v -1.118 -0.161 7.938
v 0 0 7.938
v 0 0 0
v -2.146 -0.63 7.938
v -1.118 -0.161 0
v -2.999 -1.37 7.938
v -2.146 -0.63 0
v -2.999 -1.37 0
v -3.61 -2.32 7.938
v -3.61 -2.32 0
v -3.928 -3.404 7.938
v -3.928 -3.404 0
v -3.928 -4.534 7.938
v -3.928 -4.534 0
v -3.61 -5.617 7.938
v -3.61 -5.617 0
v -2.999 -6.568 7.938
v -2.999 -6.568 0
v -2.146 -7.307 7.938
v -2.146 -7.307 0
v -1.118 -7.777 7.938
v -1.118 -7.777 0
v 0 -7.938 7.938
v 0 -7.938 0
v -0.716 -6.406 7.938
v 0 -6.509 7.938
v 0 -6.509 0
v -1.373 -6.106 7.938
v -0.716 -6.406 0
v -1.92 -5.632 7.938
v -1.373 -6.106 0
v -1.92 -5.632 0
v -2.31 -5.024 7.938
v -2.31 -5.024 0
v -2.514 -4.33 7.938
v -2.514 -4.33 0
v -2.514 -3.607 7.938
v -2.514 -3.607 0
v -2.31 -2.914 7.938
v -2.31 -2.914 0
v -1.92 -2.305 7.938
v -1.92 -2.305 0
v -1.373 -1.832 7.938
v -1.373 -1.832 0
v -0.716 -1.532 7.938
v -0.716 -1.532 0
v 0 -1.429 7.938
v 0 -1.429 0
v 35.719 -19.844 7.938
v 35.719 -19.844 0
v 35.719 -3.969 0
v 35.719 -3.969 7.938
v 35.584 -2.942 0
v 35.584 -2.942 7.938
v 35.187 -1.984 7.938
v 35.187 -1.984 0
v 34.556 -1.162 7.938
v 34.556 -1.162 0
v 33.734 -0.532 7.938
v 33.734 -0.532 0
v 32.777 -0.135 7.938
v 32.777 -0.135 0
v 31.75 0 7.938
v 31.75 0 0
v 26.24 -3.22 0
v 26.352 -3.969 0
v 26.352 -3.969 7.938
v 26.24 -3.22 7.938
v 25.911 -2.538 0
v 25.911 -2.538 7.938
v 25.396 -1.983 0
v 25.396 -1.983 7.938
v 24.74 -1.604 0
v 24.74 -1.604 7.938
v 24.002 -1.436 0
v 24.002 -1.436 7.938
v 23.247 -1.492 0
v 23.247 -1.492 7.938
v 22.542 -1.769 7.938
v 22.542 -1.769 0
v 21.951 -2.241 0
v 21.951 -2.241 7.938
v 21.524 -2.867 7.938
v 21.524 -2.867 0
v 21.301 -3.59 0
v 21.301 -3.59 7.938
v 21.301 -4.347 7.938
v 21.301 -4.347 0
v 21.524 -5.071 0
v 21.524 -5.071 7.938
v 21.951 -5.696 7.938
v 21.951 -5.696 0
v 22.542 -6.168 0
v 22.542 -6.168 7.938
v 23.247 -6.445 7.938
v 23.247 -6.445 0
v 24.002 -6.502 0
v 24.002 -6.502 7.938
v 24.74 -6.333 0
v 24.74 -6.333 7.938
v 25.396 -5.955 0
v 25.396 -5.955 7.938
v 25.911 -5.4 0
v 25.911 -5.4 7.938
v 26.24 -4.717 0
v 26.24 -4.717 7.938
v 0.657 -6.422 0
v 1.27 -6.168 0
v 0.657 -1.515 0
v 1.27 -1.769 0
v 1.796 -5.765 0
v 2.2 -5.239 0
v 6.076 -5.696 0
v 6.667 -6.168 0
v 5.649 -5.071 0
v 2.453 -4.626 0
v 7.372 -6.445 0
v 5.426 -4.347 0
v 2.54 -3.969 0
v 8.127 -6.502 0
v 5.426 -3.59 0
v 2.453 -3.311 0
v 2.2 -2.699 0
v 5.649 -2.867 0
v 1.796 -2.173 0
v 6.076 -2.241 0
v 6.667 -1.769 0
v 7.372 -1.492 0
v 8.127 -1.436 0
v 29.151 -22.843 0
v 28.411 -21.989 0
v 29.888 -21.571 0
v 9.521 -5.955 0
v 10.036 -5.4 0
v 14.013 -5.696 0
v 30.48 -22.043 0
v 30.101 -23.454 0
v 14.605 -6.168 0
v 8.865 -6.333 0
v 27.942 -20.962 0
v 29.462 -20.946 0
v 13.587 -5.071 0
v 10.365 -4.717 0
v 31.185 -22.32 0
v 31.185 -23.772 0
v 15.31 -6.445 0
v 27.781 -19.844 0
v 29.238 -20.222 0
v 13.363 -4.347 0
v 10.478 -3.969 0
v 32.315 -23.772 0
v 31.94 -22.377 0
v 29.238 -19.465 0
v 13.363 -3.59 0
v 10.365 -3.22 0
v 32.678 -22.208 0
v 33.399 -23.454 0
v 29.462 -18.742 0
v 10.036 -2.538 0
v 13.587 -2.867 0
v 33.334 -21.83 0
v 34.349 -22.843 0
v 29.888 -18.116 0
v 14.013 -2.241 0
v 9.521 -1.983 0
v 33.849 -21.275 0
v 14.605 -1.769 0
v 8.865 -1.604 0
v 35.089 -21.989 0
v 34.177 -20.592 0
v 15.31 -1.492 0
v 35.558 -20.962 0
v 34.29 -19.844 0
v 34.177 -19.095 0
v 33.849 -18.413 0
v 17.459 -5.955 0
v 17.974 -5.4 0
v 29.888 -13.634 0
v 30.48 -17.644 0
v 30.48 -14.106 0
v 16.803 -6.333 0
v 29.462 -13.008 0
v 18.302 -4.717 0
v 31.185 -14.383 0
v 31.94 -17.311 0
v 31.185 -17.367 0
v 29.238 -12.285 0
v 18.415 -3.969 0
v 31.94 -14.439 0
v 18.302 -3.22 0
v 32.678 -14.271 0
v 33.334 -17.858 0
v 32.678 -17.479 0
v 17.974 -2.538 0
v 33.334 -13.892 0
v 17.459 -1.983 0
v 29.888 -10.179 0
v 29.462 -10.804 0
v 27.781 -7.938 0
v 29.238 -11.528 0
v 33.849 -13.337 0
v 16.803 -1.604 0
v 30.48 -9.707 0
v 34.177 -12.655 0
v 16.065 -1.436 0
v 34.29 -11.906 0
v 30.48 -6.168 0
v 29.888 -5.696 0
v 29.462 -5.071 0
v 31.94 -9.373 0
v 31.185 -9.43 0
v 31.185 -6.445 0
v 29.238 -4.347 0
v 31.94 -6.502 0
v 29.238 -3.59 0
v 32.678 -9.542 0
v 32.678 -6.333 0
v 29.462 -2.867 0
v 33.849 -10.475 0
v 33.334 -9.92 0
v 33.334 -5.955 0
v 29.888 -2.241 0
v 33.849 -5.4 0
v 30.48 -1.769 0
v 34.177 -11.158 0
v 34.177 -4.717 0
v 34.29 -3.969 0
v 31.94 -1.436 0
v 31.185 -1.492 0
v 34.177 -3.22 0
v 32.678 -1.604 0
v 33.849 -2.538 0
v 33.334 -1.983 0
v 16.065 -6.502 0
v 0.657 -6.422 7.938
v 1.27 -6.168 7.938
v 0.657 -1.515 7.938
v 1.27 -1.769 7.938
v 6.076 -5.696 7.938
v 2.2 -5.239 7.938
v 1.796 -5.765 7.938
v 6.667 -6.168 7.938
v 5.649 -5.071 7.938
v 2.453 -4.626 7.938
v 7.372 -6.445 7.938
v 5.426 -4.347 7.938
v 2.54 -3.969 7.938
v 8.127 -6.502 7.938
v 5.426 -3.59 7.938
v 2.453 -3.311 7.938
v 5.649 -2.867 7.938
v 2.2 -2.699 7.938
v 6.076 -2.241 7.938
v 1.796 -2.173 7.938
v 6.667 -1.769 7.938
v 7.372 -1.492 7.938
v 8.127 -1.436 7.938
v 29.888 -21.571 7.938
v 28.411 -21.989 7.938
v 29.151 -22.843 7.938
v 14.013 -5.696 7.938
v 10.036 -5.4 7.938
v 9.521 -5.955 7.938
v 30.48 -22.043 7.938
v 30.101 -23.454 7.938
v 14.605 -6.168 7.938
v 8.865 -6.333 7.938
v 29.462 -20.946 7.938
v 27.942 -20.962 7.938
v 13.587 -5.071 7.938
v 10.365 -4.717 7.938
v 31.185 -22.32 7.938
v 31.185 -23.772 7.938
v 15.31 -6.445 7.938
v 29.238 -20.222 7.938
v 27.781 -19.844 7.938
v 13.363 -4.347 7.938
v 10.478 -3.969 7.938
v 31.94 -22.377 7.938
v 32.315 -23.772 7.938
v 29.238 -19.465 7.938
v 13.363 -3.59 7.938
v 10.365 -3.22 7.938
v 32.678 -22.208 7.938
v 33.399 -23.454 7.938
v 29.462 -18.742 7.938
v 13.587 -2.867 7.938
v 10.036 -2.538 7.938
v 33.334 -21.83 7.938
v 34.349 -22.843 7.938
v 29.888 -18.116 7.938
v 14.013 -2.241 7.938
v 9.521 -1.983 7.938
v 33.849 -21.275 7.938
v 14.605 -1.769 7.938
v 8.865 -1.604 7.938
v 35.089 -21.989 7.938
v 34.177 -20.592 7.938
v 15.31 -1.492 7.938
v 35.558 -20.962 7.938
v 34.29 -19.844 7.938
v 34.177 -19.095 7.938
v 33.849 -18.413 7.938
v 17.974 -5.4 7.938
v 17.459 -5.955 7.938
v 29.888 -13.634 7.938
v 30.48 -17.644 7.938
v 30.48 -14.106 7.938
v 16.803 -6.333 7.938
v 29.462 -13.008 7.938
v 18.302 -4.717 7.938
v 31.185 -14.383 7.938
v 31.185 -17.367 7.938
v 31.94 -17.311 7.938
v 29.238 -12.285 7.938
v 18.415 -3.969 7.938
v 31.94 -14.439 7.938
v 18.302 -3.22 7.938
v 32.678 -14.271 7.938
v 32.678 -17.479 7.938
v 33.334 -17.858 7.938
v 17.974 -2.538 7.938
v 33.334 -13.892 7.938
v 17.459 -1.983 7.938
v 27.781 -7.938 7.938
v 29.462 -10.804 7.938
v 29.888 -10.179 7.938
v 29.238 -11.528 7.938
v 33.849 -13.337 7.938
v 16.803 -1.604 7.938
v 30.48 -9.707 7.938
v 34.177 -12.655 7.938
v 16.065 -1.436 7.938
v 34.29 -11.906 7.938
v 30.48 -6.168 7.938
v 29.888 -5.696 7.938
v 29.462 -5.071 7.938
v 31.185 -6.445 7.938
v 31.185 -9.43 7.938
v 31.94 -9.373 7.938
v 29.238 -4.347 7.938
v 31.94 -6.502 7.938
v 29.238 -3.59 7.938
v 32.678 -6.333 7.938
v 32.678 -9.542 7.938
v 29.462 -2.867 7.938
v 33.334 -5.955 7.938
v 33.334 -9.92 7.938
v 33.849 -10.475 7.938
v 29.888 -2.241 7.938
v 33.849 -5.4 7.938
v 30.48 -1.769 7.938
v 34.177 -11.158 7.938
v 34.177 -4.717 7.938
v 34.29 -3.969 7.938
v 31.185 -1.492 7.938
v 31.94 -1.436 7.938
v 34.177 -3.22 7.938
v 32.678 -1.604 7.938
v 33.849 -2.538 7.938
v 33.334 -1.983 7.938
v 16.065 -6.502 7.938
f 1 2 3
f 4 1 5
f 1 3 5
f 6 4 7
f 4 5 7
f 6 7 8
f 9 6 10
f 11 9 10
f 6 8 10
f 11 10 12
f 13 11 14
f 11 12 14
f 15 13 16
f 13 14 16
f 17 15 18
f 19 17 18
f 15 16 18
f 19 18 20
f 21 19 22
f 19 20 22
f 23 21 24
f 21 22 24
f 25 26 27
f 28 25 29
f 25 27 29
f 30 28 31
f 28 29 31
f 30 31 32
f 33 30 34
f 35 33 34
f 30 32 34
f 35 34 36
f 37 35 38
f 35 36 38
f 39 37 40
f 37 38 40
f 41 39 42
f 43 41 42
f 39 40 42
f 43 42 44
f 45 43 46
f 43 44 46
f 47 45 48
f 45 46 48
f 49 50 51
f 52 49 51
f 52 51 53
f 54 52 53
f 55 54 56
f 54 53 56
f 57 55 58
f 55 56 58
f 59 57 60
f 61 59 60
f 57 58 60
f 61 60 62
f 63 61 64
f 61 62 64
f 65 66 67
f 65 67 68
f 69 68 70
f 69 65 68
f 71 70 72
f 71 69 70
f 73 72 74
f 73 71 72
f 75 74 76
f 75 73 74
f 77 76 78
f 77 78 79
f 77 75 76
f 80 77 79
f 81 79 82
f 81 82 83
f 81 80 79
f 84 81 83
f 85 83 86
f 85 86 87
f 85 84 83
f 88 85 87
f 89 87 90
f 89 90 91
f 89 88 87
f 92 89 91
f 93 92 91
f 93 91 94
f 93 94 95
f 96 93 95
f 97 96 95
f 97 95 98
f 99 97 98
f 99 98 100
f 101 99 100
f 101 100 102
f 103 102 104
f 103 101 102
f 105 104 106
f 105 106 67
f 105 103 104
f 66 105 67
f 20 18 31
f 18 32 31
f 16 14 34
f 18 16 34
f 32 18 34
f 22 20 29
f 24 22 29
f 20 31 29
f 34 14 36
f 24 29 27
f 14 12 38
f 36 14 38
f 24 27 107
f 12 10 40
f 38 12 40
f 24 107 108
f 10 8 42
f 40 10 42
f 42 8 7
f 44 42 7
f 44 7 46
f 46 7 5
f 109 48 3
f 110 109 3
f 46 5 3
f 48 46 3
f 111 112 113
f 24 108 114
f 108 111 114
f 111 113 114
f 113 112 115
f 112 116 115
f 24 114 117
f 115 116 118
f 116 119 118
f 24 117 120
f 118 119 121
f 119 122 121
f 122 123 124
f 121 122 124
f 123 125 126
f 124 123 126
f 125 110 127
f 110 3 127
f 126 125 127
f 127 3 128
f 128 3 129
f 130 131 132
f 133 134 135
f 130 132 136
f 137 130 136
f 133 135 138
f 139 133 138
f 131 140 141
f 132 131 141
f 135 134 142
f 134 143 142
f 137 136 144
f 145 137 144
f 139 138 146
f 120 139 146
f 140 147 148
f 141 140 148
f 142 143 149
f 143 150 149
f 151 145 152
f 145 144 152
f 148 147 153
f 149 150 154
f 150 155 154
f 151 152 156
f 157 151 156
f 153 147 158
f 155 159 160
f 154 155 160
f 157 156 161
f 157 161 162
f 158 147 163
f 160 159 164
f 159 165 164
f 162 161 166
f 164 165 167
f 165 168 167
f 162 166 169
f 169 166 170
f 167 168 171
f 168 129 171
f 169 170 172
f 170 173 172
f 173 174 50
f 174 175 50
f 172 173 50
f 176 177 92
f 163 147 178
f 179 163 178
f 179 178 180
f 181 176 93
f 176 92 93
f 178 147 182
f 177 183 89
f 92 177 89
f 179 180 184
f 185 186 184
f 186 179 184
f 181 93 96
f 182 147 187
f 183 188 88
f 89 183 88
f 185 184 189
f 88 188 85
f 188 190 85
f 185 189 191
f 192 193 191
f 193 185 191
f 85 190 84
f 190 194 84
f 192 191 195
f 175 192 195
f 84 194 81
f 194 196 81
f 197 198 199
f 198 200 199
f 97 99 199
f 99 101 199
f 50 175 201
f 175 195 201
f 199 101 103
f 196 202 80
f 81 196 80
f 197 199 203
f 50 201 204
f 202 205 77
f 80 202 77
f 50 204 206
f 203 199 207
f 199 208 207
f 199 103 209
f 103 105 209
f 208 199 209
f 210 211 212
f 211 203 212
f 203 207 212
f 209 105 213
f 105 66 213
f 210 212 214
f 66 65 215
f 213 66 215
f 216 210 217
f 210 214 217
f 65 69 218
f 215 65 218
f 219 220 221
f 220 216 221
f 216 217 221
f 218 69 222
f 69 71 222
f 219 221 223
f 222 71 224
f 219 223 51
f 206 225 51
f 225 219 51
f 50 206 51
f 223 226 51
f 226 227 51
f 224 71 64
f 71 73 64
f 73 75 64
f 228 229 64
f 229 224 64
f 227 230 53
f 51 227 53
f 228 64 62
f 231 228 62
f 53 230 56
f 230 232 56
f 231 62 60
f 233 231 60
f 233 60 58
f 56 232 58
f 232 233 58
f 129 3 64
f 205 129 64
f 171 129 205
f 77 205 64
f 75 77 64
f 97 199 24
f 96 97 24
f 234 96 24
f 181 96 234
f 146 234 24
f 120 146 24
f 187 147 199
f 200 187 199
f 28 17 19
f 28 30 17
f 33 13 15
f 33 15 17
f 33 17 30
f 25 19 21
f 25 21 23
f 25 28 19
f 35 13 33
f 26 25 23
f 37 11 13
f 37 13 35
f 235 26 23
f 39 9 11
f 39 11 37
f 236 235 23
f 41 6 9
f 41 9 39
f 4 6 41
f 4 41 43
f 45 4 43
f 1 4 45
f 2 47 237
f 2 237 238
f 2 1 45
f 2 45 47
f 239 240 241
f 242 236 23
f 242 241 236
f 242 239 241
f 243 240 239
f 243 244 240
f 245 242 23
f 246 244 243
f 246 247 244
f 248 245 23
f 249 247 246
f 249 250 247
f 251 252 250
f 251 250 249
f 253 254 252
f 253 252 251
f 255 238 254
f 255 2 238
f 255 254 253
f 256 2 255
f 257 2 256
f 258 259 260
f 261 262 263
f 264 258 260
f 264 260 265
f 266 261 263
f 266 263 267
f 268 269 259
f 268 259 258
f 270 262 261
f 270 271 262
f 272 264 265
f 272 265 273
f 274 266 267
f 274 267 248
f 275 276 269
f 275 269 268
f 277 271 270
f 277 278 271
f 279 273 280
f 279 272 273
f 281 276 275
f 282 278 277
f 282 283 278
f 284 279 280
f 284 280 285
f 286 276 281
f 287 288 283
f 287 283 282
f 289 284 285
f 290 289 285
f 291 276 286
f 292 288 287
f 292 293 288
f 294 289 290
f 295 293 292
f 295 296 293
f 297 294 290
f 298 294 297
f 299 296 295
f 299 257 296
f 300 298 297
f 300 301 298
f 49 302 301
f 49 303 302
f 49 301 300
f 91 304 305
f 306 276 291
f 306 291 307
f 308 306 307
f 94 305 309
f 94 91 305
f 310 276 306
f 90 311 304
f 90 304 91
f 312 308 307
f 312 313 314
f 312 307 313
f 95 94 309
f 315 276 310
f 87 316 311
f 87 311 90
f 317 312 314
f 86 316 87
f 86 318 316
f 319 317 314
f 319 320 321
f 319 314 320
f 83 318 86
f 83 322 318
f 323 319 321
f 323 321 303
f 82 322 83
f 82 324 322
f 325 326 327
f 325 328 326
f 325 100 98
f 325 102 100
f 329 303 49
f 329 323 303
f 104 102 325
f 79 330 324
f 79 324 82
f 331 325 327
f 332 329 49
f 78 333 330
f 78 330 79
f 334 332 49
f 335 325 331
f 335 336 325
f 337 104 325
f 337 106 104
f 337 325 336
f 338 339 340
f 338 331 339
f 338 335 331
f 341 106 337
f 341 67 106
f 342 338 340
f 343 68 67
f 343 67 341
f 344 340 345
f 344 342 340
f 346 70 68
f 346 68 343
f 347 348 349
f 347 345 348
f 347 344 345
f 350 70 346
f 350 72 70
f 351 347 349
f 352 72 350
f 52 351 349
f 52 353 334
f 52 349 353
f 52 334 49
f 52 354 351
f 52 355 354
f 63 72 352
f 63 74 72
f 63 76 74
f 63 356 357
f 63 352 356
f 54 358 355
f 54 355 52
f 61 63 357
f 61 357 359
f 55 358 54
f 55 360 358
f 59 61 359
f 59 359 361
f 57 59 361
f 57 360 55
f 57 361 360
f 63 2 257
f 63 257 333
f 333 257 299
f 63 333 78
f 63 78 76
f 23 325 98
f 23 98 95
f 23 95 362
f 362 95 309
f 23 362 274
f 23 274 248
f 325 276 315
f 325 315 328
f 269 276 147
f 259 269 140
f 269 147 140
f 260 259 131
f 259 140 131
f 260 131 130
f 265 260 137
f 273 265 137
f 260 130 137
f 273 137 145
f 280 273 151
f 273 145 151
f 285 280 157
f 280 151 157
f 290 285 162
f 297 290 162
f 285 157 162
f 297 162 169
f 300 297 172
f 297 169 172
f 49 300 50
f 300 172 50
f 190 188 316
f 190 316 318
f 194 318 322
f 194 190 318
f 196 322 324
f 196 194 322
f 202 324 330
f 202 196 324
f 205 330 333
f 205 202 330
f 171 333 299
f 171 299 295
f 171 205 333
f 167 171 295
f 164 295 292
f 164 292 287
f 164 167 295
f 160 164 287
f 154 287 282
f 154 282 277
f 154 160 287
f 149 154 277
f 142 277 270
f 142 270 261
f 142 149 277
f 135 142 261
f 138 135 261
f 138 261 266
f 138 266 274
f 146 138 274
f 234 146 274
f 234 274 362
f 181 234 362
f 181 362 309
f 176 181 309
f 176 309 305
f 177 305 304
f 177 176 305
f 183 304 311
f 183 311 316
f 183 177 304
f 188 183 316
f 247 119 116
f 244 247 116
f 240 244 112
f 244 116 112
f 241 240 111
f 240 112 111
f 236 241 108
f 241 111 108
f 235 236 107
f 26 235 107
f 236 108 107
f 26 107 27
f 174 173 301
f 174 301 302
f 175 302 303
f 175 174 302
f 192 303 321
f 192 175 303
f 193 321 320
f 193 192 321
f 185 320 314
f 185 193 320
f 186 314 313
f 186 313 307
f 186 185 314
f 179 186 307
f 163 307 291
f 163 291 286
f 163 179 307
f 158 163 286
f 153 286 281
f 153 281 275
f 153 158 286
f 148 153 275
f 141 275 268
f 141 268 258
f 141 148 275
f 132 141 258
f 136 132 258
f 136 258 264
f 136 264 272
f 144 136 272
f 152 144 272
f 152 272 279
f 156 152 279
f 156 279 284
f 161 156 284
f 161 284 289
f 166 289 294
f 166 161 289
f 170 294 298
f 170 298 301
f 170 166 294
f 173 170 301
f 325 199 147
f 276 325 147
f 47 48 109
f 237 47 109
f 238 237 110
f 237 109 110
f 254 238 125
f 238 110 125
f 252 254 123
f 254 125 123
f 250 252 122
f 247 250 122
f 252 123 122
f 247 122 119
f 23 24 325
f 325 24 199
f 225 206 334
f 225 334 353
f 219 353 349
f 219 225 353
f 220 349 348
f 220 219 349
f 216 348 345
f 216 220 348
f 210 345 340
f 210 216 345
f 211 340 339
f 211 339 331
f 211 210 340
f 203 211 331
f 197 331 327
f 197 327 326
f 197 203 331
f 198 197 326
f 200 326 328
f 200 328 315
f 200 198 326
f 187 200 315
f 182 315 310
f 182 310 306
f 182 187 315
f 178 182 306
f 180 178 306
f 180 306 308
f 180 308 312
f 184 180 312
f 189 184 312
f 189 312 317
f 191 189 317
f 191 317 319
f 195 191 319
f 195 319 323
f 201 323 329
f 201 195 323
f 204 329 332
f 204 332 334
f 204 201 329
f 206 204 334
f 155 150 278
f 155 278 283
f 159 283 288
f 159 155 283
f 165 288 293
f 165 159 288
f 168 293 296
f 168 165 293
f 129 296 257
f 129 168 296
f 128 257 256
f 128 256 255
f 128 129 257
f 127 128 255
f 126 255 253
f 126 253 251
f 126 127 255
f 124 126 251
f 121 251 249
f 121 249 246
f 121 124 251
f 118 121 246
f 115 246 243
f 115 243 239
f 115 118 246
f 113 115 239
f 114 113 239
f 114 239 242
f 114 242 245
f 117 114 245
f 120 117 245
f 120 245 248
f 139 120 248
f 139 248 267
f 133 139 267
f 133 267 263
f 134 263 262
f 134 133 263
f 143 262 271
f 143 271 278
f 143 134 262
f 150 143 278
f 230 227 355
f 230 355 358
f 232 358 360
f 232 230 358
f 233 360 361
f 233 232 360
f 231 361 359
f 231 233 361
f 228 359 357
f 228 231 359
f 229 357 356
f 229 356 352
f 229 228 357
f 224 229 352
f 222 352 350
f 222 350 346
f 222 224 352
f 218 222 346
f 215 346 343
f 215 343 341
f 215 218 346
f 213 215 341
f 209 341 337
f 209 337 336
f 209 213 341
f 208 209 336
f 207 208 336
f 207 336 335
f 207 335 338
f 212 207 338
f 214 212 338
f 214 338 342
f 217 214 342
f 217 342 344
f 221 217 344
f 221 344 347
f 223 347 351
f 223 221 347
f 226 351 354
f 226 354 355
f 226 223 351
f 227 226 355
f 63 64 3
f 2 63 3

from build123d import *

# Parameters (mm, degrees)
F0_R     = 2.54
F1_DEPTH = 7.9375


with BuildPart() as f1:
    # F0 (on Top) → F1 (new body)
    with BuildSketch(Plane.XY):
        with BuildLine():
            Line((31.75, 0), (0, 0))
            Line((0, 0), (0, -1.42875))
            ThreePointArc((0, -1.42875), (1.796051, -2.172699), (2.54, -3.96875))
            ThreePointArc((2.54, -3.96875), (1.796051, -5.764801), (0, -6.50875))
            Line((0, -6.50875), (0, -7.9375))
            Line((0, -7.9375), (27.78125, -7.9375))
            Line((27.78125, -7.9375), (27.78125, -19.84375))
            ThreePointArc((27.78125, -19.84375), (31.75, -23.8125), (35.71875, -19.84375))
            Line((35.71875, -19.84375), (35.71875, -3.96875))
            ThreePointArc((35.71875, -3.96875), (34.55633, -1.16242), (31.75, 0))
        make_face()
        with Locations((31.75, -19.84375)):
            Circle(F0_R, mode=Mode.SUBTRACT)
        with Locations((7.9375, -3.96875)):
            Circle(F0_R, mode=Mode.SUBTRACT)
        with Locations((31.75, -11.90625)):
            Circle(F0_R, mode=Mode.SUBTRACT)
        with Locations((15.875, -3.96875)):
            Circle(F0_R, mode=Mode.SUBTRACT)
        with Locations((23.8125, -3.96875)):
            Circle(F0_R, mode=Mode.SUBTRACT)
        with Locations((31.75, -3.96875)):
            Circle(F0_R, mode=Mode.SUBTRACT)
        with BuildLine():
            Line((0, -1.42875), (0, 0))
            ThreePointArc((0, 0), (-3.96875, -3.96875), (0, -7.9375))
            Line((0, -7.9375), (0, -6.50875))
            ThreePointArc((0, -6.50875), (-2.54, -3.96875), (0, -1.42875))
        make_face()
    extrude(amount=F1_DEPTH)


solid = f1.part
